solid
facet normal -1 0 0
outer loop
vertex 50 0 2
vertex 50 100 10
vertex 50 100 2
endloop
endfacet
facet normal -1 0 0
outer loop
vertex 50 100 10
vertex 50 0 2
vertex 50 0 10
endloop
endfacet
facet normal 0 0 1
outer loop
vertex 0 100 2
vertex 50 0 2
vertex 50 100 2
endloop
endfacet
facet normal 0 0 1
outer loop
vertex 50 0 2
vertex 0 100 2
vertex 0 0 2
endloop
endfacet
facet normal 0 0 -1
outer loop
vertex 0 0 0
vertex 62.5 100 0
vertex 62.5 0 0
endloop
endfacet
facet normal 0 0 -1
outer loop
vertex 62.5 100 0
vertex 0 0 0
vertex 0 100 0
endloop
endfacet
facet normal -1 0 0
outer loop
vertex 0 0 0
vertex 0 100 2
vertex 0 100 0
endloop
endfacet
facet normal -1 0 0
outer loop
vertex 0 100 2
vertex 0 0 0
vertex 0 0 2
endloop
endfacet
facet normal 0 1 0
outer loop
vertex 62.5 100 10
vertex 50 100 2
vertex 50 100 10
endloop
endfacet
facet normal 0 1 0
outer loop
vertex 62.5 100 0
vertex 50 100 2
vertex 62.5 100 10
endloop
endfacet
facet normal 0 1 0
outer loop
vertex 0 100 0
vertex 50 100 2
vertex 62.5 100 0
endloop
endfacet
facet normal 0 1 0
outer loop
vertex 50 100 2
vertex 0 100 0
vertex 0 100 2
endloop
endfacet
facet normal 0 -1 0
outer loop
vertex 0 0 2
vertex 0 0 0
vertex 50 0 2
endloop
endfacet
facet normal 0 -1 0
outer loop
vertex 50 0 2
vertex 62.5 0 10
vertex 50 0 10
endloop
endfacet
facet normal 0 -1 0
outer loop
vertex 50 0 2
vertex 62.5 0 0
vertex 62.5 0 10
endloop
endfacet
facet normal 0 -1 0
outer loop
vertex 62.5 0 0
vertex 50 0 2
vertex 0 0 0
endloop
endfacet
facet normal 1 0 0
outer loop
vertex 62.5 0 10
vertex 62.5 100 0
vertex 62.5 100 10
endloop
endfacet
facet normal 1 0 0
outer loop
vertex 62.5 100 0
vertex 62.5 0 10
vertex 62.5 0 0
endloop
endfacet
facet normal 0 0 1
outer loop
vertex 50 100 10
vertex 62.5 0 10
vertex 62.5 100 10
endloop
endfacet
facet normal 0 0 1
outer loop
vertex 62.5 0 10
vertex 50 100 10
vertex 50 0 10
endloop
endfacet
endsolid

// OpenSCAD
TotalWidth = 100;
TotalLength = 100;
InitialThickness = 2; //orginal 2
FinalThickness = 10; //50 for high side.

function quarterLength() = TotalLength/8;
function halfLength() = TotalLength/2;

/*
Notes: 3/30; Added halfLength to make smaller end longer and more flexible.
        and shorten the handle to get into smaller spaces.
*/

union()
{
    //for(j=[0:5])
        for(i = [0:10:FinalThickness])
        {
            
            if(i != 0) 
                {
                    translate([halfLength() + quarterLength()*(i/10)*(i-10),0,0])
                    cube([quarterLength() ,TotalWidth,i]); 
                }
                else 
                {
                    cube([halfLength() ,TotalWidth,InitialThickness]);
                }
            echo(i);
        }
    
}
